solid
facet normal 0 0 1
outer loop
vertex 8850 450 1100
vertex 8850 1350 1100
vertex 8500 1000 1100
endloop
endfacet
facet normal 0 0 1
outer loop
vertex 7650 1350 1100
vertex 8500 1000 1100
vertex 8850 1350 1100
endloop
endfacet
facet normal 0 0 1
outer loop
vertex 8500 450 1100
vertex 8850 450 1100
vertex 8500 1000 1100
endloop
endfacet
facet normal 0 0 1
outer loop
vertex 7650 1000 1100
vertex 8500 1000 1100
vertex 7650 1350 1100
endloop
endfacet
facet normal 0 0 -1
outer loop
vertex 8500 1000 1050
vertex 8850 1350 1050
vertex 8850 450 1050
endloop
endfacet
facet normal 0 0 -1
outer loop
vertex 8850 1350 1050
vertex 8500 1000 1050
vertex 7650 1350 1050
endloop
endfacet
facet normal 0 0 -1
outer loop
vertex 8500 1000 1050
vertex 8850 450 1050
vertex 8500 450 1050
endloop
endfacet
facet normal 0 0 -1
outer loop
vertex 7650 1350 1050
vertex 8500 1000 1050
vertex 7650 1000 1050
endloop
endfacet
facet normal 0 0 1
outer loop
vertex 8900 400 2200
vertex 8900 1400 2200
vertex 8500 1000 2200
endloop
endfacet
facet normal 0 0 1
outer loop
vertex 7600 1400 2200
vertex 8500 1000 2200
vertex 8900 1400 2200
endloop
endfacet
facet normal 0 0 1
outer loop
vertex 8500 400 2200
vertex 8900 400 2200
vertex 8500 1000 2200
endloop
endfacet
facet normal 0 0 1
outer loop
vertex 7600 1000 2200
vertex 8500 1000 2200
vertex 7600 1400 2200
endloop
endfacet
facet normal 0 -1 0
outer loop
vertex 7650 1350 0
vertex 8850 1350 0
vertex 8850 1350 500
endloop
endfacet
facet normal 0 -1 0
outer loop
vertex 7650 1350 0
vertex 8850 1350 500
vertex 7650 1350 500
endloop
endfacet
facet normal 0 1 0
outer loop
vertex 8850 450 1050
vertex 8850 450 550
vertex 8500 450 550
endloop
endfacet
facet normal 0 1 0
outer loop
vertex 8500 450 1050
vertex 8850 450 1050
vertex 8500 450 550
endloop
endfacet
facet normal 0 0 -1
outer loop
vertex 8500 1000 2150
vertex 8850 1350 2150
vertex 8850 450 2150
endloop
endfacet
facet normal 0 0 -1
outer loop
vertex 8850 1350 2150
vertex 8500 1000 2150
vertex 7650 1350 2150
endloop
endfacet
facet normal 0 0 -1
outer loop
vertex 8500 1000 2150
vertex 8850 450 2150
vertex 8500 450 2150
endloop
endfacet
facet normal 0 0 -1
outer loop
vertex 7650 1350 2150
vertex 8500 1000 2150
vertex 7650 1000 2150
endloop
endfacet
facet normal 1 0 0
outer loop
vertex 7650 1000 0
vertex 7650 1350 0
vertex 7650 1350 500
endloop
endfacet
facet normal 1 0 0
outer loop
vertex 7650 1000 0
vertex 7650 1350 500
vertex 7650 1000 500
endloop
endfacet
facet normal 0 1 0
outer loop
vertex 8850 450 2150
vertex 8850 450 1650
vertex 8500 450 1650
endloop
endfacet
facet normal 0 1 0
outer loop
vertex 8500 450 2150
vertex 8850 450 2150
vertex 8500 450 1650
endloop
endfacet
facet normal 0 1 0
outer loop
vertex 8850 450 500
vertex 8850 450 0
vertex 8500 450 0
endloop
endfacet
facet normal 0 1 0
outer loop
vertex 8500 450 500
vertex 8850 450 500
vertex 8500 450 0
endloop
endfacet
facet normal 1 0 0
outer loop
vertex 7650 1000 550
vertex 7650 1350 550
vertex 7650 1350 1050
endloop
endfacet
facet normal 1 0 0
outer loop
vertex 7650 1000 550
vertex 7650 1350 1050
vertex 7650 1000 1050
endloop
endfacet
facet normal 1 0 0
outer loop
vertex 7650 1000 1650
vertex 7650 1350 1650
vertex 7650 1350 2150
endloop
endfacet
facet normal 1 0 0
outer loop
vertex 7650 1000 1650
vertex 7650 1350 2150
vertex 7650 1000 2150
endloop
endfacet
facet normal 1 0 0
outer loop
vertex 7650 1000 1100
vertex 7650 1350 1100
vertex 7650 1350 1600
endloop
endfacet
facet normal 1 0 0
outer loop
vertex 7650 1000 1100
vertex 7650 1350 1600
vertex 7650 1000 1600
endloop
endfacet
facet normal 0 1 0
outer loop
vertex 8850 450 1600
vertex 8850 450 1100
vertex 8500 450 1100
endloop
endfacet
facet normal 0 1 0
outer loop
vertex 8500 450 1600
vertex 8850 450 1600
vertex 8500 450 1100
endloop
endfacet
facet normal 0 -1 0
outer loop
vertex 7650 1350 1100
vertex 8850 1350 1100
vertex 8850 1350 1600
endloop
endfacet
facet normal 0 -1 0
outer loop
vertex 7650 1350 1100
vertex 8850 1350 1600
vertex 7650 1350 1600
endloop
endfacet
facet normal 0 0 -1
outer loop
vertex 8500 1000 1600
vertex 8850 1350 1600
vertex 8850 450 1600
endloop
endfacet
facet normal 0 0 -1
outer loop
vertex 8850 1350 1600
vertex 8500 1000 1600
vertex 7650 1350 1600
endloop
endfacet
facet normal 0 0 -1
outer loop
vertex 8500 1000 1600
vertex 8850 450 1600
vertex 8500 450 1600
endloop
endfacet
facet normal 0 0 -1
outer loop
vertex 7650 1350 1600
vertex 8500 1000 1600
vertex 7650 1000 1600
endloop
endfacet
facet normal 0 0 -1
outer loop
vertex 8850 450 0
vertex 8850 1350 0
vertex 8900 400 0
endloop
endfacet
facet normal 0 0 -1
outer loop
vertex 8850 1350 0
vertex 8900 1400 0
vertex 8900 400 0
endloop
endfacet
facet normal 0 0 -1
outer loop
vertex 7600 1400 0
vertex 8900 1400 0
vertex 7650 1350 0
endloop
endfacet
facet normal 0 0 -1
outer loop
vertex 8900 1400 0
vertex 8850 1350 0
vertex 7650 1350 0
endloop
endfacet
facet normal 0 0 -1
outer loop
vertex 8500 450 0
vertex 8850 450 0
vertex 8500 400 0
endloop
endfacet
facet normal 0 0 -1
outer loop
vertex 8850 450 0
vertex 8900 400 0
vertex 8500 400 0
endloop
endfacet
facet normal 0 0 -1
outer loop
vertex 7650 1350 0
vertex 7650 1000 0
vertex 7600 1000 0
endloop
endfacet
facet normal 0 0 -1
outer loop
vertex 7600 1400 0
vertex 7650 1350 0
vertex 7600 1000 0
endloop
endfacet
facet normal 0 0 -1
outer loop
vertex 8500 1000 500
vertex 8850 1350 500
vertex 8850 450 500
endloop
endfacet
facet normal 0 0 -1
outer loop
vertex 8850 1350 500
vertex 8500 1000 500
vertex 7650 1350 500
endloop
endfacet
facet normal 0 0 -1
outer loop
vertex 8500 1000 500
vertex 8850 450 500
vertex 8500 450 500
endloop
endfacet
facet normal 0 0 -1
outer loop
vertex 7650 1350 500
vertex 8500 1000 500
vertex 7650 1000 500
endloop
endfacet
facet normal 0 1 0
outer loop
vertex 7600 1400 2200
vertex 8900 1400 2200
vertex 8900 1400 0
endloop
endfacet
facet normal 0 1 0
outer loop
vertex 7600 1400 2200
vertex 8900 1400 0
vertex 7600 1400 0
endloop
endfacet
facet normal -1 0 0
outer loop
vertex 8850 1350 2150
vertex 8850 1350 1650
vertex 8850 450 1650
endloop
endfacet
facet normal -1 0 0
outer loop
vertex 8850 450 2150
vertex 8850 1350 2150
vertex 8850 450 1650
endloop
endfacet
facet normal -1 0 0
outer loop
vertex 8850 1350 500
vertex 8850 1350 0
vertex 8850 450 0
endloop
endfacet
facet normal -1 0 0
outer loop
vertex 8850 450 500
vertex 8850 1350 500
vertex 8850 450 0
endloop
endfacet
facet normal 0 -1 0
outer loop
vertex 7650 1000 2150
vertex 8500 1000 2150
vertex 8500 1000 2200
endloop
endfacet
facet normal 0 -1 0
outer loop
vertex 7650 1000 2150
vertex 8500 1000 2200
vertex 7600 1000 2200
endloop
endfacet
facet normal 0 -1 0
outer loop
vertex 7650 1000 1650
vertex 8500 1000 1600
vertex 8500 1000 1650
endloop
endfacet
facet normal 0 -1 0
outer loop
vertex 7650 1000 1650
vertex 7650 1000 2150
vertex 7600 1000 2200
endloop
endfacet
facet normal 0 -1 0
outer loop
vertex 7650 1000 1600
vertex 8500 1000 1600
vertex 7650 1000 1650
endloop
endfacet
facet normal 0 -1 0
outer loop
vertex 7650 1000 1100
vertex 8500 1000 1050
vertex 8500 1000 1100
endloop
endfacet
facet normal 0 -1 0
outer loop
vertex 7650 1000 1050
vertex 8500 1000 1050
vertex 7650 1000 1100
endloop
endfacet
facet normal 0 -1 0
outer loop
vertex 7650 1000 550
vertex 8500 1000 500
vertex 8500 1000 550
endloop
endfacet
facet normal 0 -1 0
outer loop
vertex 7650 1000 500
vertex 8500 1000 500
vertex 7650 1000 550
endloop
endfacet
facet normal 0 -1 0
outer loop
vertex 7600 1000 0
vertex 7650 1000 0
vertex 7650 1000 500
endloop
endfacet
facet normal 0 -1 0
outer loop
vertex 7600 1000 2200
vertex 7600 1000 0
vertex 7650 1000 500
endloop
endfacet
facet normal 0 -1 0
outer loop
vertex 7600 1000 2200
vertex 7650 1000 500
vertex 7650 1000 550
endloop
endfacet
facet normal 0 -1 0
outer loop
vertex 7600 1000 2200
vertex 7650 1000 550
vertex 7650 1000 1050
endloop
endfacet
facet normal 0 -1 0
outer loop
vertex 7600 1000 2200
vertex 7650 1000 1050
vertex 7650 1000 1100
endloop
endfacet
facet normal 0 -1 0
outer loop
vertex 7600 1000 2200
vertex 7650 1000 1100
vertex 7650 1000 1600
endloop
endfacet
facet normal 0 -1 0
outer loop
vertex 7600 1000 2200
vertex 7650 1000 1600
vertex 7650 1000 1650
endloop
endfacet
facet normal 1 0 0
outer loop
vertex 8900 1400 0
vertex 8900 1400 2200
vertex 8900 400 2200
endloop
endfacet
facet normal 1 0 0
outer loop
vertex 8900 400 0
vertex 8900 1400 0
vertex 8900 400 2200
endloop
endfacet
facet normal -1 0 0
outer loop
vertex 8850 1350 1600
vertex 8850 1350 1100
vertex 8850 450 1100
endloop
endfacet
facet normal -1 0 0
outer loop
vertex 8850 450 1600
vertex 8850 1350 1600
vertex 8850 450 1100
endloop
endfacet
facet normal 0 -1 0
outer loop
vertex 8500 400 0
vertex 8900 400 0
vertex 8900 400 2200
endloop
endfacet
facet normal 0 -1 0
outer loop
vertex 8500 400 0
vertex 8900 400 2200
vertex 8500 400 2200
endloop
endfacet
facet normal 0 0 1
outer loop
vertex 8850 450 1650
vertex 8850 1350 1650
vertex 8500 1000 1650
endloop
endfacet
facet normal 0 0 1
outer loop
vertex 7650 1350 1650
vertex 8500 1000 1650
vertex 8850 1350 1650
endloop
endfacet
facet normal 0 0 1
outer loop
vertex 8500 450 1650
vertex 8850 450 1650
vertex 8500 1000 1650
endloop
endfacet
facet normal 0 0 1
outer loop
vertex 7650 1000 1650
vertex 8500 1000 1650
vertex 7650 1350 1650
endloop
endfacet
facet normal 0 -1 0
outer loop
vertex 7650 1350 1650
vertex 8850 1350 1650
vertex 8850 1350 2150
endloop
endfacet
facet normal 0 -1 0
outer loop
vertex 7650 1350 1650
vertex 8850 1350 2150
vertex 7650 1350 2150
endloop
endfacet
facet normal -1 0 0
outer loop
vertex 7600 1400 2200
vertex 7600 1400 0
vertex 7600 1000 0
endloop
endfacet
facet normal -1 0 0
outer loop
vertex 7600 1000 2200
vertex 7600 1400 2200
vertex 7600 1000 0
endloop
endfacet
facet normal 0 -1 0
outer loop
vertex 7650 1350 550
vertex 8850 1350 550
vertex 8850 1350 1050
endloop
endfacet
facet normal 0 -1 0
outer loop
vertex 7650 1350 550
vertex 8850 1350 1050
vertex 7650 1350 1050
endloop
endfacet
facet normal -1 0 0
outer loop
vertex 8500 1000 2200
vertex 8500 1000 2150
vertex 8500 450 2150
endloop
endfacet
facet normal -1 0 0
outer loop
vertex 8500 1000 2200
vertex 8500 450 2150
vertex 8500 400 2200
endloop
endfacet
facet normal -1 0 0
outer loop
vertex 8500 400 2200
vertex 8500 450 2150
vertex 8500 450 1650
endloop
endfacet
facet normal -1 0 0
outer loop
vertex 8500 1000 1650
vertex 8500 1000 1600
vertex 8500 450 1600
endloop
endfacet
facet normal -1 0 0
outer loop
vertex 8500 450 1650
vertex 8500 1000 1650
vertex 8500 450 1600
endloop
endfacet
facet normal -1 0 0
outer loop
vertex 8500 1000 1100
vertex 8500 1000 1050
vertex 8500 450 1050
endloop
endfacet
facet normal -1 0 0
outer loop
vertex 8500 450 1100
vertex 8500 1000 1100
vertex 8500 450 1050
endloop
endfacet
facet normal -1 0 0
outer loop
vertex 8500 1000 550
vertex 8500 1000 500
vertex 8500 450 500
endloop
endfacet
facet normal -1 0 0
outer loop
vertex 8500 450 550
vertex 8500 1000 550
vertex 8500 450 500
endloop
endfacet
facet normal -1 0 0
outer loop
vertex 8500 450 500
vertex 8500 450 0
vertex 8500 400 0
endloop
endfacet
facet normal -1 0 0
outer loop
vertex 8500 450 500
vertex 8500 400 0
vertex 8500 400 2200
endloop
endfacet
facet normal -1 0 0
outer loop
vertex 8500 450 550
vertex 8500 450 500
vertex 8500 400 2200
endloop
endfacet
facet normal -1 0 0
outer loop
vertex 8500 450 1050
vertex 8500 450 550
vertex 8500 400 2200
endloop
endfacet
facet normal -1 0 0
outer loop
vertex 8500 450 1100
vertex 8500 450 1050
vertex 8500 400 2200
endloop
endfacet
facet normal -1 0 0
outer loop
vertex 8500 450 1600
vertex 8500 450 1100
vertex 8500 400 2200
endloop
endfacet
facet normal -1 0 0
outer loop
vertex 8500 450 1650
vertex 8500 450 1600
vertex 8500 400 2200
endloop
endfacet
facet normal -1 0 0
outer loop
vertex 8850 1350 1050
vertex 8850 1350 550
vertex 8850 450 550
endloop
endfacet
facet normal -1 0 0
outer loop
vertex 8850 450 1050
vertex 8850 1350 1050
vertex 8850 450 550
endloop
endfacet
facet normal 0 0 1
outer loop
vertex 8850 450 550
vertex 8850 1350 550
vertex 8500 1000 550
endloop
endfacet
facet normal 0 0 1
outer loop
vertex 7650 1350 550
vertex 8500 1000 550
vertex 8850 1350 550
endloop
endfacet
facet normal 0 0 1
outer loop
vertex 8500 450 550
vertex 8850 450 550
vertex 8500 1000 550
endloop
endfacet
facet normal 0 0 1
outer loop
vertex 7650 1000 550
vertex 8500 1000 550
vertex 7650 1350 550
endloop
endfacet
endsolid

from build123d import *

# Parameters (mm, degrees)
BOX3529_W        = 1200
BOX3529_H        = 900
BOX3529_DEPTH    = 500
ARRAY281_Z_COUNT = 4
ARRAY281_Z_PITCH = 550
BOX3527_W        = 400
BOX3527_H        = 600
BOX3527_DEPTH    = 2200
BOX3528_W        = 1300
BOX3528_H        = 400
BOX3528_DEPTH    = 2200


with BuildPart() as array281:
    # Box3529 → Box3529 (new body)
    with BuildSketch(Plane(origin=(8850, 1350, 0), x_dir=(-1, 0, 0), z_dir=(0, 0, 1))):
        with Locations((600, 450)):
            Rectangle(BOX3529_W, BOX3529_H)
    extrude(amount=BOX3529_DEPTH)

    # Array281 Z: Array281 ×4


with BuildPart() as array281_1:
    add(array281.part)
    with Locations(*[(0, 0, i * ARRAY281_Z_PITCH) for i in range(1, ARRAY281_Z_COUNT)]):
        add(array281.part)


with BuildPart() as box3527:
    # Box3527 → Box3527 (new body)
    with BuildSketch(Plane(origin=(8900, 1000, 0), x_dir=(-1, 0, 0), z_dir=(0, 0, 1))):
        with Locations((200, 300)):
            Rectangle(BOX3527_W, BOX3527_H)
    extrude(amount=BOX3527_DEPTH)


with BuildPart() as cut003:
    # Box3528 → Box3528 (new body)
    with BuildSketch(Plane(origin=(8900, 1400, 0), x_dir=(-1, 0, 0), z_dir=(0, 0, 1))):
        with Locations((650, 200)):
            Rectangle(BOX3528_W, BOX3528_H)
    extrude(amount=BOX3528_DEPTH)

    # Fusion015: union Box3527
    add(box3527.part)

    # Cut003: cut Array281
    add(array281_1.part, mode=Mode.SUBTRACT)


solid = cut003.part
